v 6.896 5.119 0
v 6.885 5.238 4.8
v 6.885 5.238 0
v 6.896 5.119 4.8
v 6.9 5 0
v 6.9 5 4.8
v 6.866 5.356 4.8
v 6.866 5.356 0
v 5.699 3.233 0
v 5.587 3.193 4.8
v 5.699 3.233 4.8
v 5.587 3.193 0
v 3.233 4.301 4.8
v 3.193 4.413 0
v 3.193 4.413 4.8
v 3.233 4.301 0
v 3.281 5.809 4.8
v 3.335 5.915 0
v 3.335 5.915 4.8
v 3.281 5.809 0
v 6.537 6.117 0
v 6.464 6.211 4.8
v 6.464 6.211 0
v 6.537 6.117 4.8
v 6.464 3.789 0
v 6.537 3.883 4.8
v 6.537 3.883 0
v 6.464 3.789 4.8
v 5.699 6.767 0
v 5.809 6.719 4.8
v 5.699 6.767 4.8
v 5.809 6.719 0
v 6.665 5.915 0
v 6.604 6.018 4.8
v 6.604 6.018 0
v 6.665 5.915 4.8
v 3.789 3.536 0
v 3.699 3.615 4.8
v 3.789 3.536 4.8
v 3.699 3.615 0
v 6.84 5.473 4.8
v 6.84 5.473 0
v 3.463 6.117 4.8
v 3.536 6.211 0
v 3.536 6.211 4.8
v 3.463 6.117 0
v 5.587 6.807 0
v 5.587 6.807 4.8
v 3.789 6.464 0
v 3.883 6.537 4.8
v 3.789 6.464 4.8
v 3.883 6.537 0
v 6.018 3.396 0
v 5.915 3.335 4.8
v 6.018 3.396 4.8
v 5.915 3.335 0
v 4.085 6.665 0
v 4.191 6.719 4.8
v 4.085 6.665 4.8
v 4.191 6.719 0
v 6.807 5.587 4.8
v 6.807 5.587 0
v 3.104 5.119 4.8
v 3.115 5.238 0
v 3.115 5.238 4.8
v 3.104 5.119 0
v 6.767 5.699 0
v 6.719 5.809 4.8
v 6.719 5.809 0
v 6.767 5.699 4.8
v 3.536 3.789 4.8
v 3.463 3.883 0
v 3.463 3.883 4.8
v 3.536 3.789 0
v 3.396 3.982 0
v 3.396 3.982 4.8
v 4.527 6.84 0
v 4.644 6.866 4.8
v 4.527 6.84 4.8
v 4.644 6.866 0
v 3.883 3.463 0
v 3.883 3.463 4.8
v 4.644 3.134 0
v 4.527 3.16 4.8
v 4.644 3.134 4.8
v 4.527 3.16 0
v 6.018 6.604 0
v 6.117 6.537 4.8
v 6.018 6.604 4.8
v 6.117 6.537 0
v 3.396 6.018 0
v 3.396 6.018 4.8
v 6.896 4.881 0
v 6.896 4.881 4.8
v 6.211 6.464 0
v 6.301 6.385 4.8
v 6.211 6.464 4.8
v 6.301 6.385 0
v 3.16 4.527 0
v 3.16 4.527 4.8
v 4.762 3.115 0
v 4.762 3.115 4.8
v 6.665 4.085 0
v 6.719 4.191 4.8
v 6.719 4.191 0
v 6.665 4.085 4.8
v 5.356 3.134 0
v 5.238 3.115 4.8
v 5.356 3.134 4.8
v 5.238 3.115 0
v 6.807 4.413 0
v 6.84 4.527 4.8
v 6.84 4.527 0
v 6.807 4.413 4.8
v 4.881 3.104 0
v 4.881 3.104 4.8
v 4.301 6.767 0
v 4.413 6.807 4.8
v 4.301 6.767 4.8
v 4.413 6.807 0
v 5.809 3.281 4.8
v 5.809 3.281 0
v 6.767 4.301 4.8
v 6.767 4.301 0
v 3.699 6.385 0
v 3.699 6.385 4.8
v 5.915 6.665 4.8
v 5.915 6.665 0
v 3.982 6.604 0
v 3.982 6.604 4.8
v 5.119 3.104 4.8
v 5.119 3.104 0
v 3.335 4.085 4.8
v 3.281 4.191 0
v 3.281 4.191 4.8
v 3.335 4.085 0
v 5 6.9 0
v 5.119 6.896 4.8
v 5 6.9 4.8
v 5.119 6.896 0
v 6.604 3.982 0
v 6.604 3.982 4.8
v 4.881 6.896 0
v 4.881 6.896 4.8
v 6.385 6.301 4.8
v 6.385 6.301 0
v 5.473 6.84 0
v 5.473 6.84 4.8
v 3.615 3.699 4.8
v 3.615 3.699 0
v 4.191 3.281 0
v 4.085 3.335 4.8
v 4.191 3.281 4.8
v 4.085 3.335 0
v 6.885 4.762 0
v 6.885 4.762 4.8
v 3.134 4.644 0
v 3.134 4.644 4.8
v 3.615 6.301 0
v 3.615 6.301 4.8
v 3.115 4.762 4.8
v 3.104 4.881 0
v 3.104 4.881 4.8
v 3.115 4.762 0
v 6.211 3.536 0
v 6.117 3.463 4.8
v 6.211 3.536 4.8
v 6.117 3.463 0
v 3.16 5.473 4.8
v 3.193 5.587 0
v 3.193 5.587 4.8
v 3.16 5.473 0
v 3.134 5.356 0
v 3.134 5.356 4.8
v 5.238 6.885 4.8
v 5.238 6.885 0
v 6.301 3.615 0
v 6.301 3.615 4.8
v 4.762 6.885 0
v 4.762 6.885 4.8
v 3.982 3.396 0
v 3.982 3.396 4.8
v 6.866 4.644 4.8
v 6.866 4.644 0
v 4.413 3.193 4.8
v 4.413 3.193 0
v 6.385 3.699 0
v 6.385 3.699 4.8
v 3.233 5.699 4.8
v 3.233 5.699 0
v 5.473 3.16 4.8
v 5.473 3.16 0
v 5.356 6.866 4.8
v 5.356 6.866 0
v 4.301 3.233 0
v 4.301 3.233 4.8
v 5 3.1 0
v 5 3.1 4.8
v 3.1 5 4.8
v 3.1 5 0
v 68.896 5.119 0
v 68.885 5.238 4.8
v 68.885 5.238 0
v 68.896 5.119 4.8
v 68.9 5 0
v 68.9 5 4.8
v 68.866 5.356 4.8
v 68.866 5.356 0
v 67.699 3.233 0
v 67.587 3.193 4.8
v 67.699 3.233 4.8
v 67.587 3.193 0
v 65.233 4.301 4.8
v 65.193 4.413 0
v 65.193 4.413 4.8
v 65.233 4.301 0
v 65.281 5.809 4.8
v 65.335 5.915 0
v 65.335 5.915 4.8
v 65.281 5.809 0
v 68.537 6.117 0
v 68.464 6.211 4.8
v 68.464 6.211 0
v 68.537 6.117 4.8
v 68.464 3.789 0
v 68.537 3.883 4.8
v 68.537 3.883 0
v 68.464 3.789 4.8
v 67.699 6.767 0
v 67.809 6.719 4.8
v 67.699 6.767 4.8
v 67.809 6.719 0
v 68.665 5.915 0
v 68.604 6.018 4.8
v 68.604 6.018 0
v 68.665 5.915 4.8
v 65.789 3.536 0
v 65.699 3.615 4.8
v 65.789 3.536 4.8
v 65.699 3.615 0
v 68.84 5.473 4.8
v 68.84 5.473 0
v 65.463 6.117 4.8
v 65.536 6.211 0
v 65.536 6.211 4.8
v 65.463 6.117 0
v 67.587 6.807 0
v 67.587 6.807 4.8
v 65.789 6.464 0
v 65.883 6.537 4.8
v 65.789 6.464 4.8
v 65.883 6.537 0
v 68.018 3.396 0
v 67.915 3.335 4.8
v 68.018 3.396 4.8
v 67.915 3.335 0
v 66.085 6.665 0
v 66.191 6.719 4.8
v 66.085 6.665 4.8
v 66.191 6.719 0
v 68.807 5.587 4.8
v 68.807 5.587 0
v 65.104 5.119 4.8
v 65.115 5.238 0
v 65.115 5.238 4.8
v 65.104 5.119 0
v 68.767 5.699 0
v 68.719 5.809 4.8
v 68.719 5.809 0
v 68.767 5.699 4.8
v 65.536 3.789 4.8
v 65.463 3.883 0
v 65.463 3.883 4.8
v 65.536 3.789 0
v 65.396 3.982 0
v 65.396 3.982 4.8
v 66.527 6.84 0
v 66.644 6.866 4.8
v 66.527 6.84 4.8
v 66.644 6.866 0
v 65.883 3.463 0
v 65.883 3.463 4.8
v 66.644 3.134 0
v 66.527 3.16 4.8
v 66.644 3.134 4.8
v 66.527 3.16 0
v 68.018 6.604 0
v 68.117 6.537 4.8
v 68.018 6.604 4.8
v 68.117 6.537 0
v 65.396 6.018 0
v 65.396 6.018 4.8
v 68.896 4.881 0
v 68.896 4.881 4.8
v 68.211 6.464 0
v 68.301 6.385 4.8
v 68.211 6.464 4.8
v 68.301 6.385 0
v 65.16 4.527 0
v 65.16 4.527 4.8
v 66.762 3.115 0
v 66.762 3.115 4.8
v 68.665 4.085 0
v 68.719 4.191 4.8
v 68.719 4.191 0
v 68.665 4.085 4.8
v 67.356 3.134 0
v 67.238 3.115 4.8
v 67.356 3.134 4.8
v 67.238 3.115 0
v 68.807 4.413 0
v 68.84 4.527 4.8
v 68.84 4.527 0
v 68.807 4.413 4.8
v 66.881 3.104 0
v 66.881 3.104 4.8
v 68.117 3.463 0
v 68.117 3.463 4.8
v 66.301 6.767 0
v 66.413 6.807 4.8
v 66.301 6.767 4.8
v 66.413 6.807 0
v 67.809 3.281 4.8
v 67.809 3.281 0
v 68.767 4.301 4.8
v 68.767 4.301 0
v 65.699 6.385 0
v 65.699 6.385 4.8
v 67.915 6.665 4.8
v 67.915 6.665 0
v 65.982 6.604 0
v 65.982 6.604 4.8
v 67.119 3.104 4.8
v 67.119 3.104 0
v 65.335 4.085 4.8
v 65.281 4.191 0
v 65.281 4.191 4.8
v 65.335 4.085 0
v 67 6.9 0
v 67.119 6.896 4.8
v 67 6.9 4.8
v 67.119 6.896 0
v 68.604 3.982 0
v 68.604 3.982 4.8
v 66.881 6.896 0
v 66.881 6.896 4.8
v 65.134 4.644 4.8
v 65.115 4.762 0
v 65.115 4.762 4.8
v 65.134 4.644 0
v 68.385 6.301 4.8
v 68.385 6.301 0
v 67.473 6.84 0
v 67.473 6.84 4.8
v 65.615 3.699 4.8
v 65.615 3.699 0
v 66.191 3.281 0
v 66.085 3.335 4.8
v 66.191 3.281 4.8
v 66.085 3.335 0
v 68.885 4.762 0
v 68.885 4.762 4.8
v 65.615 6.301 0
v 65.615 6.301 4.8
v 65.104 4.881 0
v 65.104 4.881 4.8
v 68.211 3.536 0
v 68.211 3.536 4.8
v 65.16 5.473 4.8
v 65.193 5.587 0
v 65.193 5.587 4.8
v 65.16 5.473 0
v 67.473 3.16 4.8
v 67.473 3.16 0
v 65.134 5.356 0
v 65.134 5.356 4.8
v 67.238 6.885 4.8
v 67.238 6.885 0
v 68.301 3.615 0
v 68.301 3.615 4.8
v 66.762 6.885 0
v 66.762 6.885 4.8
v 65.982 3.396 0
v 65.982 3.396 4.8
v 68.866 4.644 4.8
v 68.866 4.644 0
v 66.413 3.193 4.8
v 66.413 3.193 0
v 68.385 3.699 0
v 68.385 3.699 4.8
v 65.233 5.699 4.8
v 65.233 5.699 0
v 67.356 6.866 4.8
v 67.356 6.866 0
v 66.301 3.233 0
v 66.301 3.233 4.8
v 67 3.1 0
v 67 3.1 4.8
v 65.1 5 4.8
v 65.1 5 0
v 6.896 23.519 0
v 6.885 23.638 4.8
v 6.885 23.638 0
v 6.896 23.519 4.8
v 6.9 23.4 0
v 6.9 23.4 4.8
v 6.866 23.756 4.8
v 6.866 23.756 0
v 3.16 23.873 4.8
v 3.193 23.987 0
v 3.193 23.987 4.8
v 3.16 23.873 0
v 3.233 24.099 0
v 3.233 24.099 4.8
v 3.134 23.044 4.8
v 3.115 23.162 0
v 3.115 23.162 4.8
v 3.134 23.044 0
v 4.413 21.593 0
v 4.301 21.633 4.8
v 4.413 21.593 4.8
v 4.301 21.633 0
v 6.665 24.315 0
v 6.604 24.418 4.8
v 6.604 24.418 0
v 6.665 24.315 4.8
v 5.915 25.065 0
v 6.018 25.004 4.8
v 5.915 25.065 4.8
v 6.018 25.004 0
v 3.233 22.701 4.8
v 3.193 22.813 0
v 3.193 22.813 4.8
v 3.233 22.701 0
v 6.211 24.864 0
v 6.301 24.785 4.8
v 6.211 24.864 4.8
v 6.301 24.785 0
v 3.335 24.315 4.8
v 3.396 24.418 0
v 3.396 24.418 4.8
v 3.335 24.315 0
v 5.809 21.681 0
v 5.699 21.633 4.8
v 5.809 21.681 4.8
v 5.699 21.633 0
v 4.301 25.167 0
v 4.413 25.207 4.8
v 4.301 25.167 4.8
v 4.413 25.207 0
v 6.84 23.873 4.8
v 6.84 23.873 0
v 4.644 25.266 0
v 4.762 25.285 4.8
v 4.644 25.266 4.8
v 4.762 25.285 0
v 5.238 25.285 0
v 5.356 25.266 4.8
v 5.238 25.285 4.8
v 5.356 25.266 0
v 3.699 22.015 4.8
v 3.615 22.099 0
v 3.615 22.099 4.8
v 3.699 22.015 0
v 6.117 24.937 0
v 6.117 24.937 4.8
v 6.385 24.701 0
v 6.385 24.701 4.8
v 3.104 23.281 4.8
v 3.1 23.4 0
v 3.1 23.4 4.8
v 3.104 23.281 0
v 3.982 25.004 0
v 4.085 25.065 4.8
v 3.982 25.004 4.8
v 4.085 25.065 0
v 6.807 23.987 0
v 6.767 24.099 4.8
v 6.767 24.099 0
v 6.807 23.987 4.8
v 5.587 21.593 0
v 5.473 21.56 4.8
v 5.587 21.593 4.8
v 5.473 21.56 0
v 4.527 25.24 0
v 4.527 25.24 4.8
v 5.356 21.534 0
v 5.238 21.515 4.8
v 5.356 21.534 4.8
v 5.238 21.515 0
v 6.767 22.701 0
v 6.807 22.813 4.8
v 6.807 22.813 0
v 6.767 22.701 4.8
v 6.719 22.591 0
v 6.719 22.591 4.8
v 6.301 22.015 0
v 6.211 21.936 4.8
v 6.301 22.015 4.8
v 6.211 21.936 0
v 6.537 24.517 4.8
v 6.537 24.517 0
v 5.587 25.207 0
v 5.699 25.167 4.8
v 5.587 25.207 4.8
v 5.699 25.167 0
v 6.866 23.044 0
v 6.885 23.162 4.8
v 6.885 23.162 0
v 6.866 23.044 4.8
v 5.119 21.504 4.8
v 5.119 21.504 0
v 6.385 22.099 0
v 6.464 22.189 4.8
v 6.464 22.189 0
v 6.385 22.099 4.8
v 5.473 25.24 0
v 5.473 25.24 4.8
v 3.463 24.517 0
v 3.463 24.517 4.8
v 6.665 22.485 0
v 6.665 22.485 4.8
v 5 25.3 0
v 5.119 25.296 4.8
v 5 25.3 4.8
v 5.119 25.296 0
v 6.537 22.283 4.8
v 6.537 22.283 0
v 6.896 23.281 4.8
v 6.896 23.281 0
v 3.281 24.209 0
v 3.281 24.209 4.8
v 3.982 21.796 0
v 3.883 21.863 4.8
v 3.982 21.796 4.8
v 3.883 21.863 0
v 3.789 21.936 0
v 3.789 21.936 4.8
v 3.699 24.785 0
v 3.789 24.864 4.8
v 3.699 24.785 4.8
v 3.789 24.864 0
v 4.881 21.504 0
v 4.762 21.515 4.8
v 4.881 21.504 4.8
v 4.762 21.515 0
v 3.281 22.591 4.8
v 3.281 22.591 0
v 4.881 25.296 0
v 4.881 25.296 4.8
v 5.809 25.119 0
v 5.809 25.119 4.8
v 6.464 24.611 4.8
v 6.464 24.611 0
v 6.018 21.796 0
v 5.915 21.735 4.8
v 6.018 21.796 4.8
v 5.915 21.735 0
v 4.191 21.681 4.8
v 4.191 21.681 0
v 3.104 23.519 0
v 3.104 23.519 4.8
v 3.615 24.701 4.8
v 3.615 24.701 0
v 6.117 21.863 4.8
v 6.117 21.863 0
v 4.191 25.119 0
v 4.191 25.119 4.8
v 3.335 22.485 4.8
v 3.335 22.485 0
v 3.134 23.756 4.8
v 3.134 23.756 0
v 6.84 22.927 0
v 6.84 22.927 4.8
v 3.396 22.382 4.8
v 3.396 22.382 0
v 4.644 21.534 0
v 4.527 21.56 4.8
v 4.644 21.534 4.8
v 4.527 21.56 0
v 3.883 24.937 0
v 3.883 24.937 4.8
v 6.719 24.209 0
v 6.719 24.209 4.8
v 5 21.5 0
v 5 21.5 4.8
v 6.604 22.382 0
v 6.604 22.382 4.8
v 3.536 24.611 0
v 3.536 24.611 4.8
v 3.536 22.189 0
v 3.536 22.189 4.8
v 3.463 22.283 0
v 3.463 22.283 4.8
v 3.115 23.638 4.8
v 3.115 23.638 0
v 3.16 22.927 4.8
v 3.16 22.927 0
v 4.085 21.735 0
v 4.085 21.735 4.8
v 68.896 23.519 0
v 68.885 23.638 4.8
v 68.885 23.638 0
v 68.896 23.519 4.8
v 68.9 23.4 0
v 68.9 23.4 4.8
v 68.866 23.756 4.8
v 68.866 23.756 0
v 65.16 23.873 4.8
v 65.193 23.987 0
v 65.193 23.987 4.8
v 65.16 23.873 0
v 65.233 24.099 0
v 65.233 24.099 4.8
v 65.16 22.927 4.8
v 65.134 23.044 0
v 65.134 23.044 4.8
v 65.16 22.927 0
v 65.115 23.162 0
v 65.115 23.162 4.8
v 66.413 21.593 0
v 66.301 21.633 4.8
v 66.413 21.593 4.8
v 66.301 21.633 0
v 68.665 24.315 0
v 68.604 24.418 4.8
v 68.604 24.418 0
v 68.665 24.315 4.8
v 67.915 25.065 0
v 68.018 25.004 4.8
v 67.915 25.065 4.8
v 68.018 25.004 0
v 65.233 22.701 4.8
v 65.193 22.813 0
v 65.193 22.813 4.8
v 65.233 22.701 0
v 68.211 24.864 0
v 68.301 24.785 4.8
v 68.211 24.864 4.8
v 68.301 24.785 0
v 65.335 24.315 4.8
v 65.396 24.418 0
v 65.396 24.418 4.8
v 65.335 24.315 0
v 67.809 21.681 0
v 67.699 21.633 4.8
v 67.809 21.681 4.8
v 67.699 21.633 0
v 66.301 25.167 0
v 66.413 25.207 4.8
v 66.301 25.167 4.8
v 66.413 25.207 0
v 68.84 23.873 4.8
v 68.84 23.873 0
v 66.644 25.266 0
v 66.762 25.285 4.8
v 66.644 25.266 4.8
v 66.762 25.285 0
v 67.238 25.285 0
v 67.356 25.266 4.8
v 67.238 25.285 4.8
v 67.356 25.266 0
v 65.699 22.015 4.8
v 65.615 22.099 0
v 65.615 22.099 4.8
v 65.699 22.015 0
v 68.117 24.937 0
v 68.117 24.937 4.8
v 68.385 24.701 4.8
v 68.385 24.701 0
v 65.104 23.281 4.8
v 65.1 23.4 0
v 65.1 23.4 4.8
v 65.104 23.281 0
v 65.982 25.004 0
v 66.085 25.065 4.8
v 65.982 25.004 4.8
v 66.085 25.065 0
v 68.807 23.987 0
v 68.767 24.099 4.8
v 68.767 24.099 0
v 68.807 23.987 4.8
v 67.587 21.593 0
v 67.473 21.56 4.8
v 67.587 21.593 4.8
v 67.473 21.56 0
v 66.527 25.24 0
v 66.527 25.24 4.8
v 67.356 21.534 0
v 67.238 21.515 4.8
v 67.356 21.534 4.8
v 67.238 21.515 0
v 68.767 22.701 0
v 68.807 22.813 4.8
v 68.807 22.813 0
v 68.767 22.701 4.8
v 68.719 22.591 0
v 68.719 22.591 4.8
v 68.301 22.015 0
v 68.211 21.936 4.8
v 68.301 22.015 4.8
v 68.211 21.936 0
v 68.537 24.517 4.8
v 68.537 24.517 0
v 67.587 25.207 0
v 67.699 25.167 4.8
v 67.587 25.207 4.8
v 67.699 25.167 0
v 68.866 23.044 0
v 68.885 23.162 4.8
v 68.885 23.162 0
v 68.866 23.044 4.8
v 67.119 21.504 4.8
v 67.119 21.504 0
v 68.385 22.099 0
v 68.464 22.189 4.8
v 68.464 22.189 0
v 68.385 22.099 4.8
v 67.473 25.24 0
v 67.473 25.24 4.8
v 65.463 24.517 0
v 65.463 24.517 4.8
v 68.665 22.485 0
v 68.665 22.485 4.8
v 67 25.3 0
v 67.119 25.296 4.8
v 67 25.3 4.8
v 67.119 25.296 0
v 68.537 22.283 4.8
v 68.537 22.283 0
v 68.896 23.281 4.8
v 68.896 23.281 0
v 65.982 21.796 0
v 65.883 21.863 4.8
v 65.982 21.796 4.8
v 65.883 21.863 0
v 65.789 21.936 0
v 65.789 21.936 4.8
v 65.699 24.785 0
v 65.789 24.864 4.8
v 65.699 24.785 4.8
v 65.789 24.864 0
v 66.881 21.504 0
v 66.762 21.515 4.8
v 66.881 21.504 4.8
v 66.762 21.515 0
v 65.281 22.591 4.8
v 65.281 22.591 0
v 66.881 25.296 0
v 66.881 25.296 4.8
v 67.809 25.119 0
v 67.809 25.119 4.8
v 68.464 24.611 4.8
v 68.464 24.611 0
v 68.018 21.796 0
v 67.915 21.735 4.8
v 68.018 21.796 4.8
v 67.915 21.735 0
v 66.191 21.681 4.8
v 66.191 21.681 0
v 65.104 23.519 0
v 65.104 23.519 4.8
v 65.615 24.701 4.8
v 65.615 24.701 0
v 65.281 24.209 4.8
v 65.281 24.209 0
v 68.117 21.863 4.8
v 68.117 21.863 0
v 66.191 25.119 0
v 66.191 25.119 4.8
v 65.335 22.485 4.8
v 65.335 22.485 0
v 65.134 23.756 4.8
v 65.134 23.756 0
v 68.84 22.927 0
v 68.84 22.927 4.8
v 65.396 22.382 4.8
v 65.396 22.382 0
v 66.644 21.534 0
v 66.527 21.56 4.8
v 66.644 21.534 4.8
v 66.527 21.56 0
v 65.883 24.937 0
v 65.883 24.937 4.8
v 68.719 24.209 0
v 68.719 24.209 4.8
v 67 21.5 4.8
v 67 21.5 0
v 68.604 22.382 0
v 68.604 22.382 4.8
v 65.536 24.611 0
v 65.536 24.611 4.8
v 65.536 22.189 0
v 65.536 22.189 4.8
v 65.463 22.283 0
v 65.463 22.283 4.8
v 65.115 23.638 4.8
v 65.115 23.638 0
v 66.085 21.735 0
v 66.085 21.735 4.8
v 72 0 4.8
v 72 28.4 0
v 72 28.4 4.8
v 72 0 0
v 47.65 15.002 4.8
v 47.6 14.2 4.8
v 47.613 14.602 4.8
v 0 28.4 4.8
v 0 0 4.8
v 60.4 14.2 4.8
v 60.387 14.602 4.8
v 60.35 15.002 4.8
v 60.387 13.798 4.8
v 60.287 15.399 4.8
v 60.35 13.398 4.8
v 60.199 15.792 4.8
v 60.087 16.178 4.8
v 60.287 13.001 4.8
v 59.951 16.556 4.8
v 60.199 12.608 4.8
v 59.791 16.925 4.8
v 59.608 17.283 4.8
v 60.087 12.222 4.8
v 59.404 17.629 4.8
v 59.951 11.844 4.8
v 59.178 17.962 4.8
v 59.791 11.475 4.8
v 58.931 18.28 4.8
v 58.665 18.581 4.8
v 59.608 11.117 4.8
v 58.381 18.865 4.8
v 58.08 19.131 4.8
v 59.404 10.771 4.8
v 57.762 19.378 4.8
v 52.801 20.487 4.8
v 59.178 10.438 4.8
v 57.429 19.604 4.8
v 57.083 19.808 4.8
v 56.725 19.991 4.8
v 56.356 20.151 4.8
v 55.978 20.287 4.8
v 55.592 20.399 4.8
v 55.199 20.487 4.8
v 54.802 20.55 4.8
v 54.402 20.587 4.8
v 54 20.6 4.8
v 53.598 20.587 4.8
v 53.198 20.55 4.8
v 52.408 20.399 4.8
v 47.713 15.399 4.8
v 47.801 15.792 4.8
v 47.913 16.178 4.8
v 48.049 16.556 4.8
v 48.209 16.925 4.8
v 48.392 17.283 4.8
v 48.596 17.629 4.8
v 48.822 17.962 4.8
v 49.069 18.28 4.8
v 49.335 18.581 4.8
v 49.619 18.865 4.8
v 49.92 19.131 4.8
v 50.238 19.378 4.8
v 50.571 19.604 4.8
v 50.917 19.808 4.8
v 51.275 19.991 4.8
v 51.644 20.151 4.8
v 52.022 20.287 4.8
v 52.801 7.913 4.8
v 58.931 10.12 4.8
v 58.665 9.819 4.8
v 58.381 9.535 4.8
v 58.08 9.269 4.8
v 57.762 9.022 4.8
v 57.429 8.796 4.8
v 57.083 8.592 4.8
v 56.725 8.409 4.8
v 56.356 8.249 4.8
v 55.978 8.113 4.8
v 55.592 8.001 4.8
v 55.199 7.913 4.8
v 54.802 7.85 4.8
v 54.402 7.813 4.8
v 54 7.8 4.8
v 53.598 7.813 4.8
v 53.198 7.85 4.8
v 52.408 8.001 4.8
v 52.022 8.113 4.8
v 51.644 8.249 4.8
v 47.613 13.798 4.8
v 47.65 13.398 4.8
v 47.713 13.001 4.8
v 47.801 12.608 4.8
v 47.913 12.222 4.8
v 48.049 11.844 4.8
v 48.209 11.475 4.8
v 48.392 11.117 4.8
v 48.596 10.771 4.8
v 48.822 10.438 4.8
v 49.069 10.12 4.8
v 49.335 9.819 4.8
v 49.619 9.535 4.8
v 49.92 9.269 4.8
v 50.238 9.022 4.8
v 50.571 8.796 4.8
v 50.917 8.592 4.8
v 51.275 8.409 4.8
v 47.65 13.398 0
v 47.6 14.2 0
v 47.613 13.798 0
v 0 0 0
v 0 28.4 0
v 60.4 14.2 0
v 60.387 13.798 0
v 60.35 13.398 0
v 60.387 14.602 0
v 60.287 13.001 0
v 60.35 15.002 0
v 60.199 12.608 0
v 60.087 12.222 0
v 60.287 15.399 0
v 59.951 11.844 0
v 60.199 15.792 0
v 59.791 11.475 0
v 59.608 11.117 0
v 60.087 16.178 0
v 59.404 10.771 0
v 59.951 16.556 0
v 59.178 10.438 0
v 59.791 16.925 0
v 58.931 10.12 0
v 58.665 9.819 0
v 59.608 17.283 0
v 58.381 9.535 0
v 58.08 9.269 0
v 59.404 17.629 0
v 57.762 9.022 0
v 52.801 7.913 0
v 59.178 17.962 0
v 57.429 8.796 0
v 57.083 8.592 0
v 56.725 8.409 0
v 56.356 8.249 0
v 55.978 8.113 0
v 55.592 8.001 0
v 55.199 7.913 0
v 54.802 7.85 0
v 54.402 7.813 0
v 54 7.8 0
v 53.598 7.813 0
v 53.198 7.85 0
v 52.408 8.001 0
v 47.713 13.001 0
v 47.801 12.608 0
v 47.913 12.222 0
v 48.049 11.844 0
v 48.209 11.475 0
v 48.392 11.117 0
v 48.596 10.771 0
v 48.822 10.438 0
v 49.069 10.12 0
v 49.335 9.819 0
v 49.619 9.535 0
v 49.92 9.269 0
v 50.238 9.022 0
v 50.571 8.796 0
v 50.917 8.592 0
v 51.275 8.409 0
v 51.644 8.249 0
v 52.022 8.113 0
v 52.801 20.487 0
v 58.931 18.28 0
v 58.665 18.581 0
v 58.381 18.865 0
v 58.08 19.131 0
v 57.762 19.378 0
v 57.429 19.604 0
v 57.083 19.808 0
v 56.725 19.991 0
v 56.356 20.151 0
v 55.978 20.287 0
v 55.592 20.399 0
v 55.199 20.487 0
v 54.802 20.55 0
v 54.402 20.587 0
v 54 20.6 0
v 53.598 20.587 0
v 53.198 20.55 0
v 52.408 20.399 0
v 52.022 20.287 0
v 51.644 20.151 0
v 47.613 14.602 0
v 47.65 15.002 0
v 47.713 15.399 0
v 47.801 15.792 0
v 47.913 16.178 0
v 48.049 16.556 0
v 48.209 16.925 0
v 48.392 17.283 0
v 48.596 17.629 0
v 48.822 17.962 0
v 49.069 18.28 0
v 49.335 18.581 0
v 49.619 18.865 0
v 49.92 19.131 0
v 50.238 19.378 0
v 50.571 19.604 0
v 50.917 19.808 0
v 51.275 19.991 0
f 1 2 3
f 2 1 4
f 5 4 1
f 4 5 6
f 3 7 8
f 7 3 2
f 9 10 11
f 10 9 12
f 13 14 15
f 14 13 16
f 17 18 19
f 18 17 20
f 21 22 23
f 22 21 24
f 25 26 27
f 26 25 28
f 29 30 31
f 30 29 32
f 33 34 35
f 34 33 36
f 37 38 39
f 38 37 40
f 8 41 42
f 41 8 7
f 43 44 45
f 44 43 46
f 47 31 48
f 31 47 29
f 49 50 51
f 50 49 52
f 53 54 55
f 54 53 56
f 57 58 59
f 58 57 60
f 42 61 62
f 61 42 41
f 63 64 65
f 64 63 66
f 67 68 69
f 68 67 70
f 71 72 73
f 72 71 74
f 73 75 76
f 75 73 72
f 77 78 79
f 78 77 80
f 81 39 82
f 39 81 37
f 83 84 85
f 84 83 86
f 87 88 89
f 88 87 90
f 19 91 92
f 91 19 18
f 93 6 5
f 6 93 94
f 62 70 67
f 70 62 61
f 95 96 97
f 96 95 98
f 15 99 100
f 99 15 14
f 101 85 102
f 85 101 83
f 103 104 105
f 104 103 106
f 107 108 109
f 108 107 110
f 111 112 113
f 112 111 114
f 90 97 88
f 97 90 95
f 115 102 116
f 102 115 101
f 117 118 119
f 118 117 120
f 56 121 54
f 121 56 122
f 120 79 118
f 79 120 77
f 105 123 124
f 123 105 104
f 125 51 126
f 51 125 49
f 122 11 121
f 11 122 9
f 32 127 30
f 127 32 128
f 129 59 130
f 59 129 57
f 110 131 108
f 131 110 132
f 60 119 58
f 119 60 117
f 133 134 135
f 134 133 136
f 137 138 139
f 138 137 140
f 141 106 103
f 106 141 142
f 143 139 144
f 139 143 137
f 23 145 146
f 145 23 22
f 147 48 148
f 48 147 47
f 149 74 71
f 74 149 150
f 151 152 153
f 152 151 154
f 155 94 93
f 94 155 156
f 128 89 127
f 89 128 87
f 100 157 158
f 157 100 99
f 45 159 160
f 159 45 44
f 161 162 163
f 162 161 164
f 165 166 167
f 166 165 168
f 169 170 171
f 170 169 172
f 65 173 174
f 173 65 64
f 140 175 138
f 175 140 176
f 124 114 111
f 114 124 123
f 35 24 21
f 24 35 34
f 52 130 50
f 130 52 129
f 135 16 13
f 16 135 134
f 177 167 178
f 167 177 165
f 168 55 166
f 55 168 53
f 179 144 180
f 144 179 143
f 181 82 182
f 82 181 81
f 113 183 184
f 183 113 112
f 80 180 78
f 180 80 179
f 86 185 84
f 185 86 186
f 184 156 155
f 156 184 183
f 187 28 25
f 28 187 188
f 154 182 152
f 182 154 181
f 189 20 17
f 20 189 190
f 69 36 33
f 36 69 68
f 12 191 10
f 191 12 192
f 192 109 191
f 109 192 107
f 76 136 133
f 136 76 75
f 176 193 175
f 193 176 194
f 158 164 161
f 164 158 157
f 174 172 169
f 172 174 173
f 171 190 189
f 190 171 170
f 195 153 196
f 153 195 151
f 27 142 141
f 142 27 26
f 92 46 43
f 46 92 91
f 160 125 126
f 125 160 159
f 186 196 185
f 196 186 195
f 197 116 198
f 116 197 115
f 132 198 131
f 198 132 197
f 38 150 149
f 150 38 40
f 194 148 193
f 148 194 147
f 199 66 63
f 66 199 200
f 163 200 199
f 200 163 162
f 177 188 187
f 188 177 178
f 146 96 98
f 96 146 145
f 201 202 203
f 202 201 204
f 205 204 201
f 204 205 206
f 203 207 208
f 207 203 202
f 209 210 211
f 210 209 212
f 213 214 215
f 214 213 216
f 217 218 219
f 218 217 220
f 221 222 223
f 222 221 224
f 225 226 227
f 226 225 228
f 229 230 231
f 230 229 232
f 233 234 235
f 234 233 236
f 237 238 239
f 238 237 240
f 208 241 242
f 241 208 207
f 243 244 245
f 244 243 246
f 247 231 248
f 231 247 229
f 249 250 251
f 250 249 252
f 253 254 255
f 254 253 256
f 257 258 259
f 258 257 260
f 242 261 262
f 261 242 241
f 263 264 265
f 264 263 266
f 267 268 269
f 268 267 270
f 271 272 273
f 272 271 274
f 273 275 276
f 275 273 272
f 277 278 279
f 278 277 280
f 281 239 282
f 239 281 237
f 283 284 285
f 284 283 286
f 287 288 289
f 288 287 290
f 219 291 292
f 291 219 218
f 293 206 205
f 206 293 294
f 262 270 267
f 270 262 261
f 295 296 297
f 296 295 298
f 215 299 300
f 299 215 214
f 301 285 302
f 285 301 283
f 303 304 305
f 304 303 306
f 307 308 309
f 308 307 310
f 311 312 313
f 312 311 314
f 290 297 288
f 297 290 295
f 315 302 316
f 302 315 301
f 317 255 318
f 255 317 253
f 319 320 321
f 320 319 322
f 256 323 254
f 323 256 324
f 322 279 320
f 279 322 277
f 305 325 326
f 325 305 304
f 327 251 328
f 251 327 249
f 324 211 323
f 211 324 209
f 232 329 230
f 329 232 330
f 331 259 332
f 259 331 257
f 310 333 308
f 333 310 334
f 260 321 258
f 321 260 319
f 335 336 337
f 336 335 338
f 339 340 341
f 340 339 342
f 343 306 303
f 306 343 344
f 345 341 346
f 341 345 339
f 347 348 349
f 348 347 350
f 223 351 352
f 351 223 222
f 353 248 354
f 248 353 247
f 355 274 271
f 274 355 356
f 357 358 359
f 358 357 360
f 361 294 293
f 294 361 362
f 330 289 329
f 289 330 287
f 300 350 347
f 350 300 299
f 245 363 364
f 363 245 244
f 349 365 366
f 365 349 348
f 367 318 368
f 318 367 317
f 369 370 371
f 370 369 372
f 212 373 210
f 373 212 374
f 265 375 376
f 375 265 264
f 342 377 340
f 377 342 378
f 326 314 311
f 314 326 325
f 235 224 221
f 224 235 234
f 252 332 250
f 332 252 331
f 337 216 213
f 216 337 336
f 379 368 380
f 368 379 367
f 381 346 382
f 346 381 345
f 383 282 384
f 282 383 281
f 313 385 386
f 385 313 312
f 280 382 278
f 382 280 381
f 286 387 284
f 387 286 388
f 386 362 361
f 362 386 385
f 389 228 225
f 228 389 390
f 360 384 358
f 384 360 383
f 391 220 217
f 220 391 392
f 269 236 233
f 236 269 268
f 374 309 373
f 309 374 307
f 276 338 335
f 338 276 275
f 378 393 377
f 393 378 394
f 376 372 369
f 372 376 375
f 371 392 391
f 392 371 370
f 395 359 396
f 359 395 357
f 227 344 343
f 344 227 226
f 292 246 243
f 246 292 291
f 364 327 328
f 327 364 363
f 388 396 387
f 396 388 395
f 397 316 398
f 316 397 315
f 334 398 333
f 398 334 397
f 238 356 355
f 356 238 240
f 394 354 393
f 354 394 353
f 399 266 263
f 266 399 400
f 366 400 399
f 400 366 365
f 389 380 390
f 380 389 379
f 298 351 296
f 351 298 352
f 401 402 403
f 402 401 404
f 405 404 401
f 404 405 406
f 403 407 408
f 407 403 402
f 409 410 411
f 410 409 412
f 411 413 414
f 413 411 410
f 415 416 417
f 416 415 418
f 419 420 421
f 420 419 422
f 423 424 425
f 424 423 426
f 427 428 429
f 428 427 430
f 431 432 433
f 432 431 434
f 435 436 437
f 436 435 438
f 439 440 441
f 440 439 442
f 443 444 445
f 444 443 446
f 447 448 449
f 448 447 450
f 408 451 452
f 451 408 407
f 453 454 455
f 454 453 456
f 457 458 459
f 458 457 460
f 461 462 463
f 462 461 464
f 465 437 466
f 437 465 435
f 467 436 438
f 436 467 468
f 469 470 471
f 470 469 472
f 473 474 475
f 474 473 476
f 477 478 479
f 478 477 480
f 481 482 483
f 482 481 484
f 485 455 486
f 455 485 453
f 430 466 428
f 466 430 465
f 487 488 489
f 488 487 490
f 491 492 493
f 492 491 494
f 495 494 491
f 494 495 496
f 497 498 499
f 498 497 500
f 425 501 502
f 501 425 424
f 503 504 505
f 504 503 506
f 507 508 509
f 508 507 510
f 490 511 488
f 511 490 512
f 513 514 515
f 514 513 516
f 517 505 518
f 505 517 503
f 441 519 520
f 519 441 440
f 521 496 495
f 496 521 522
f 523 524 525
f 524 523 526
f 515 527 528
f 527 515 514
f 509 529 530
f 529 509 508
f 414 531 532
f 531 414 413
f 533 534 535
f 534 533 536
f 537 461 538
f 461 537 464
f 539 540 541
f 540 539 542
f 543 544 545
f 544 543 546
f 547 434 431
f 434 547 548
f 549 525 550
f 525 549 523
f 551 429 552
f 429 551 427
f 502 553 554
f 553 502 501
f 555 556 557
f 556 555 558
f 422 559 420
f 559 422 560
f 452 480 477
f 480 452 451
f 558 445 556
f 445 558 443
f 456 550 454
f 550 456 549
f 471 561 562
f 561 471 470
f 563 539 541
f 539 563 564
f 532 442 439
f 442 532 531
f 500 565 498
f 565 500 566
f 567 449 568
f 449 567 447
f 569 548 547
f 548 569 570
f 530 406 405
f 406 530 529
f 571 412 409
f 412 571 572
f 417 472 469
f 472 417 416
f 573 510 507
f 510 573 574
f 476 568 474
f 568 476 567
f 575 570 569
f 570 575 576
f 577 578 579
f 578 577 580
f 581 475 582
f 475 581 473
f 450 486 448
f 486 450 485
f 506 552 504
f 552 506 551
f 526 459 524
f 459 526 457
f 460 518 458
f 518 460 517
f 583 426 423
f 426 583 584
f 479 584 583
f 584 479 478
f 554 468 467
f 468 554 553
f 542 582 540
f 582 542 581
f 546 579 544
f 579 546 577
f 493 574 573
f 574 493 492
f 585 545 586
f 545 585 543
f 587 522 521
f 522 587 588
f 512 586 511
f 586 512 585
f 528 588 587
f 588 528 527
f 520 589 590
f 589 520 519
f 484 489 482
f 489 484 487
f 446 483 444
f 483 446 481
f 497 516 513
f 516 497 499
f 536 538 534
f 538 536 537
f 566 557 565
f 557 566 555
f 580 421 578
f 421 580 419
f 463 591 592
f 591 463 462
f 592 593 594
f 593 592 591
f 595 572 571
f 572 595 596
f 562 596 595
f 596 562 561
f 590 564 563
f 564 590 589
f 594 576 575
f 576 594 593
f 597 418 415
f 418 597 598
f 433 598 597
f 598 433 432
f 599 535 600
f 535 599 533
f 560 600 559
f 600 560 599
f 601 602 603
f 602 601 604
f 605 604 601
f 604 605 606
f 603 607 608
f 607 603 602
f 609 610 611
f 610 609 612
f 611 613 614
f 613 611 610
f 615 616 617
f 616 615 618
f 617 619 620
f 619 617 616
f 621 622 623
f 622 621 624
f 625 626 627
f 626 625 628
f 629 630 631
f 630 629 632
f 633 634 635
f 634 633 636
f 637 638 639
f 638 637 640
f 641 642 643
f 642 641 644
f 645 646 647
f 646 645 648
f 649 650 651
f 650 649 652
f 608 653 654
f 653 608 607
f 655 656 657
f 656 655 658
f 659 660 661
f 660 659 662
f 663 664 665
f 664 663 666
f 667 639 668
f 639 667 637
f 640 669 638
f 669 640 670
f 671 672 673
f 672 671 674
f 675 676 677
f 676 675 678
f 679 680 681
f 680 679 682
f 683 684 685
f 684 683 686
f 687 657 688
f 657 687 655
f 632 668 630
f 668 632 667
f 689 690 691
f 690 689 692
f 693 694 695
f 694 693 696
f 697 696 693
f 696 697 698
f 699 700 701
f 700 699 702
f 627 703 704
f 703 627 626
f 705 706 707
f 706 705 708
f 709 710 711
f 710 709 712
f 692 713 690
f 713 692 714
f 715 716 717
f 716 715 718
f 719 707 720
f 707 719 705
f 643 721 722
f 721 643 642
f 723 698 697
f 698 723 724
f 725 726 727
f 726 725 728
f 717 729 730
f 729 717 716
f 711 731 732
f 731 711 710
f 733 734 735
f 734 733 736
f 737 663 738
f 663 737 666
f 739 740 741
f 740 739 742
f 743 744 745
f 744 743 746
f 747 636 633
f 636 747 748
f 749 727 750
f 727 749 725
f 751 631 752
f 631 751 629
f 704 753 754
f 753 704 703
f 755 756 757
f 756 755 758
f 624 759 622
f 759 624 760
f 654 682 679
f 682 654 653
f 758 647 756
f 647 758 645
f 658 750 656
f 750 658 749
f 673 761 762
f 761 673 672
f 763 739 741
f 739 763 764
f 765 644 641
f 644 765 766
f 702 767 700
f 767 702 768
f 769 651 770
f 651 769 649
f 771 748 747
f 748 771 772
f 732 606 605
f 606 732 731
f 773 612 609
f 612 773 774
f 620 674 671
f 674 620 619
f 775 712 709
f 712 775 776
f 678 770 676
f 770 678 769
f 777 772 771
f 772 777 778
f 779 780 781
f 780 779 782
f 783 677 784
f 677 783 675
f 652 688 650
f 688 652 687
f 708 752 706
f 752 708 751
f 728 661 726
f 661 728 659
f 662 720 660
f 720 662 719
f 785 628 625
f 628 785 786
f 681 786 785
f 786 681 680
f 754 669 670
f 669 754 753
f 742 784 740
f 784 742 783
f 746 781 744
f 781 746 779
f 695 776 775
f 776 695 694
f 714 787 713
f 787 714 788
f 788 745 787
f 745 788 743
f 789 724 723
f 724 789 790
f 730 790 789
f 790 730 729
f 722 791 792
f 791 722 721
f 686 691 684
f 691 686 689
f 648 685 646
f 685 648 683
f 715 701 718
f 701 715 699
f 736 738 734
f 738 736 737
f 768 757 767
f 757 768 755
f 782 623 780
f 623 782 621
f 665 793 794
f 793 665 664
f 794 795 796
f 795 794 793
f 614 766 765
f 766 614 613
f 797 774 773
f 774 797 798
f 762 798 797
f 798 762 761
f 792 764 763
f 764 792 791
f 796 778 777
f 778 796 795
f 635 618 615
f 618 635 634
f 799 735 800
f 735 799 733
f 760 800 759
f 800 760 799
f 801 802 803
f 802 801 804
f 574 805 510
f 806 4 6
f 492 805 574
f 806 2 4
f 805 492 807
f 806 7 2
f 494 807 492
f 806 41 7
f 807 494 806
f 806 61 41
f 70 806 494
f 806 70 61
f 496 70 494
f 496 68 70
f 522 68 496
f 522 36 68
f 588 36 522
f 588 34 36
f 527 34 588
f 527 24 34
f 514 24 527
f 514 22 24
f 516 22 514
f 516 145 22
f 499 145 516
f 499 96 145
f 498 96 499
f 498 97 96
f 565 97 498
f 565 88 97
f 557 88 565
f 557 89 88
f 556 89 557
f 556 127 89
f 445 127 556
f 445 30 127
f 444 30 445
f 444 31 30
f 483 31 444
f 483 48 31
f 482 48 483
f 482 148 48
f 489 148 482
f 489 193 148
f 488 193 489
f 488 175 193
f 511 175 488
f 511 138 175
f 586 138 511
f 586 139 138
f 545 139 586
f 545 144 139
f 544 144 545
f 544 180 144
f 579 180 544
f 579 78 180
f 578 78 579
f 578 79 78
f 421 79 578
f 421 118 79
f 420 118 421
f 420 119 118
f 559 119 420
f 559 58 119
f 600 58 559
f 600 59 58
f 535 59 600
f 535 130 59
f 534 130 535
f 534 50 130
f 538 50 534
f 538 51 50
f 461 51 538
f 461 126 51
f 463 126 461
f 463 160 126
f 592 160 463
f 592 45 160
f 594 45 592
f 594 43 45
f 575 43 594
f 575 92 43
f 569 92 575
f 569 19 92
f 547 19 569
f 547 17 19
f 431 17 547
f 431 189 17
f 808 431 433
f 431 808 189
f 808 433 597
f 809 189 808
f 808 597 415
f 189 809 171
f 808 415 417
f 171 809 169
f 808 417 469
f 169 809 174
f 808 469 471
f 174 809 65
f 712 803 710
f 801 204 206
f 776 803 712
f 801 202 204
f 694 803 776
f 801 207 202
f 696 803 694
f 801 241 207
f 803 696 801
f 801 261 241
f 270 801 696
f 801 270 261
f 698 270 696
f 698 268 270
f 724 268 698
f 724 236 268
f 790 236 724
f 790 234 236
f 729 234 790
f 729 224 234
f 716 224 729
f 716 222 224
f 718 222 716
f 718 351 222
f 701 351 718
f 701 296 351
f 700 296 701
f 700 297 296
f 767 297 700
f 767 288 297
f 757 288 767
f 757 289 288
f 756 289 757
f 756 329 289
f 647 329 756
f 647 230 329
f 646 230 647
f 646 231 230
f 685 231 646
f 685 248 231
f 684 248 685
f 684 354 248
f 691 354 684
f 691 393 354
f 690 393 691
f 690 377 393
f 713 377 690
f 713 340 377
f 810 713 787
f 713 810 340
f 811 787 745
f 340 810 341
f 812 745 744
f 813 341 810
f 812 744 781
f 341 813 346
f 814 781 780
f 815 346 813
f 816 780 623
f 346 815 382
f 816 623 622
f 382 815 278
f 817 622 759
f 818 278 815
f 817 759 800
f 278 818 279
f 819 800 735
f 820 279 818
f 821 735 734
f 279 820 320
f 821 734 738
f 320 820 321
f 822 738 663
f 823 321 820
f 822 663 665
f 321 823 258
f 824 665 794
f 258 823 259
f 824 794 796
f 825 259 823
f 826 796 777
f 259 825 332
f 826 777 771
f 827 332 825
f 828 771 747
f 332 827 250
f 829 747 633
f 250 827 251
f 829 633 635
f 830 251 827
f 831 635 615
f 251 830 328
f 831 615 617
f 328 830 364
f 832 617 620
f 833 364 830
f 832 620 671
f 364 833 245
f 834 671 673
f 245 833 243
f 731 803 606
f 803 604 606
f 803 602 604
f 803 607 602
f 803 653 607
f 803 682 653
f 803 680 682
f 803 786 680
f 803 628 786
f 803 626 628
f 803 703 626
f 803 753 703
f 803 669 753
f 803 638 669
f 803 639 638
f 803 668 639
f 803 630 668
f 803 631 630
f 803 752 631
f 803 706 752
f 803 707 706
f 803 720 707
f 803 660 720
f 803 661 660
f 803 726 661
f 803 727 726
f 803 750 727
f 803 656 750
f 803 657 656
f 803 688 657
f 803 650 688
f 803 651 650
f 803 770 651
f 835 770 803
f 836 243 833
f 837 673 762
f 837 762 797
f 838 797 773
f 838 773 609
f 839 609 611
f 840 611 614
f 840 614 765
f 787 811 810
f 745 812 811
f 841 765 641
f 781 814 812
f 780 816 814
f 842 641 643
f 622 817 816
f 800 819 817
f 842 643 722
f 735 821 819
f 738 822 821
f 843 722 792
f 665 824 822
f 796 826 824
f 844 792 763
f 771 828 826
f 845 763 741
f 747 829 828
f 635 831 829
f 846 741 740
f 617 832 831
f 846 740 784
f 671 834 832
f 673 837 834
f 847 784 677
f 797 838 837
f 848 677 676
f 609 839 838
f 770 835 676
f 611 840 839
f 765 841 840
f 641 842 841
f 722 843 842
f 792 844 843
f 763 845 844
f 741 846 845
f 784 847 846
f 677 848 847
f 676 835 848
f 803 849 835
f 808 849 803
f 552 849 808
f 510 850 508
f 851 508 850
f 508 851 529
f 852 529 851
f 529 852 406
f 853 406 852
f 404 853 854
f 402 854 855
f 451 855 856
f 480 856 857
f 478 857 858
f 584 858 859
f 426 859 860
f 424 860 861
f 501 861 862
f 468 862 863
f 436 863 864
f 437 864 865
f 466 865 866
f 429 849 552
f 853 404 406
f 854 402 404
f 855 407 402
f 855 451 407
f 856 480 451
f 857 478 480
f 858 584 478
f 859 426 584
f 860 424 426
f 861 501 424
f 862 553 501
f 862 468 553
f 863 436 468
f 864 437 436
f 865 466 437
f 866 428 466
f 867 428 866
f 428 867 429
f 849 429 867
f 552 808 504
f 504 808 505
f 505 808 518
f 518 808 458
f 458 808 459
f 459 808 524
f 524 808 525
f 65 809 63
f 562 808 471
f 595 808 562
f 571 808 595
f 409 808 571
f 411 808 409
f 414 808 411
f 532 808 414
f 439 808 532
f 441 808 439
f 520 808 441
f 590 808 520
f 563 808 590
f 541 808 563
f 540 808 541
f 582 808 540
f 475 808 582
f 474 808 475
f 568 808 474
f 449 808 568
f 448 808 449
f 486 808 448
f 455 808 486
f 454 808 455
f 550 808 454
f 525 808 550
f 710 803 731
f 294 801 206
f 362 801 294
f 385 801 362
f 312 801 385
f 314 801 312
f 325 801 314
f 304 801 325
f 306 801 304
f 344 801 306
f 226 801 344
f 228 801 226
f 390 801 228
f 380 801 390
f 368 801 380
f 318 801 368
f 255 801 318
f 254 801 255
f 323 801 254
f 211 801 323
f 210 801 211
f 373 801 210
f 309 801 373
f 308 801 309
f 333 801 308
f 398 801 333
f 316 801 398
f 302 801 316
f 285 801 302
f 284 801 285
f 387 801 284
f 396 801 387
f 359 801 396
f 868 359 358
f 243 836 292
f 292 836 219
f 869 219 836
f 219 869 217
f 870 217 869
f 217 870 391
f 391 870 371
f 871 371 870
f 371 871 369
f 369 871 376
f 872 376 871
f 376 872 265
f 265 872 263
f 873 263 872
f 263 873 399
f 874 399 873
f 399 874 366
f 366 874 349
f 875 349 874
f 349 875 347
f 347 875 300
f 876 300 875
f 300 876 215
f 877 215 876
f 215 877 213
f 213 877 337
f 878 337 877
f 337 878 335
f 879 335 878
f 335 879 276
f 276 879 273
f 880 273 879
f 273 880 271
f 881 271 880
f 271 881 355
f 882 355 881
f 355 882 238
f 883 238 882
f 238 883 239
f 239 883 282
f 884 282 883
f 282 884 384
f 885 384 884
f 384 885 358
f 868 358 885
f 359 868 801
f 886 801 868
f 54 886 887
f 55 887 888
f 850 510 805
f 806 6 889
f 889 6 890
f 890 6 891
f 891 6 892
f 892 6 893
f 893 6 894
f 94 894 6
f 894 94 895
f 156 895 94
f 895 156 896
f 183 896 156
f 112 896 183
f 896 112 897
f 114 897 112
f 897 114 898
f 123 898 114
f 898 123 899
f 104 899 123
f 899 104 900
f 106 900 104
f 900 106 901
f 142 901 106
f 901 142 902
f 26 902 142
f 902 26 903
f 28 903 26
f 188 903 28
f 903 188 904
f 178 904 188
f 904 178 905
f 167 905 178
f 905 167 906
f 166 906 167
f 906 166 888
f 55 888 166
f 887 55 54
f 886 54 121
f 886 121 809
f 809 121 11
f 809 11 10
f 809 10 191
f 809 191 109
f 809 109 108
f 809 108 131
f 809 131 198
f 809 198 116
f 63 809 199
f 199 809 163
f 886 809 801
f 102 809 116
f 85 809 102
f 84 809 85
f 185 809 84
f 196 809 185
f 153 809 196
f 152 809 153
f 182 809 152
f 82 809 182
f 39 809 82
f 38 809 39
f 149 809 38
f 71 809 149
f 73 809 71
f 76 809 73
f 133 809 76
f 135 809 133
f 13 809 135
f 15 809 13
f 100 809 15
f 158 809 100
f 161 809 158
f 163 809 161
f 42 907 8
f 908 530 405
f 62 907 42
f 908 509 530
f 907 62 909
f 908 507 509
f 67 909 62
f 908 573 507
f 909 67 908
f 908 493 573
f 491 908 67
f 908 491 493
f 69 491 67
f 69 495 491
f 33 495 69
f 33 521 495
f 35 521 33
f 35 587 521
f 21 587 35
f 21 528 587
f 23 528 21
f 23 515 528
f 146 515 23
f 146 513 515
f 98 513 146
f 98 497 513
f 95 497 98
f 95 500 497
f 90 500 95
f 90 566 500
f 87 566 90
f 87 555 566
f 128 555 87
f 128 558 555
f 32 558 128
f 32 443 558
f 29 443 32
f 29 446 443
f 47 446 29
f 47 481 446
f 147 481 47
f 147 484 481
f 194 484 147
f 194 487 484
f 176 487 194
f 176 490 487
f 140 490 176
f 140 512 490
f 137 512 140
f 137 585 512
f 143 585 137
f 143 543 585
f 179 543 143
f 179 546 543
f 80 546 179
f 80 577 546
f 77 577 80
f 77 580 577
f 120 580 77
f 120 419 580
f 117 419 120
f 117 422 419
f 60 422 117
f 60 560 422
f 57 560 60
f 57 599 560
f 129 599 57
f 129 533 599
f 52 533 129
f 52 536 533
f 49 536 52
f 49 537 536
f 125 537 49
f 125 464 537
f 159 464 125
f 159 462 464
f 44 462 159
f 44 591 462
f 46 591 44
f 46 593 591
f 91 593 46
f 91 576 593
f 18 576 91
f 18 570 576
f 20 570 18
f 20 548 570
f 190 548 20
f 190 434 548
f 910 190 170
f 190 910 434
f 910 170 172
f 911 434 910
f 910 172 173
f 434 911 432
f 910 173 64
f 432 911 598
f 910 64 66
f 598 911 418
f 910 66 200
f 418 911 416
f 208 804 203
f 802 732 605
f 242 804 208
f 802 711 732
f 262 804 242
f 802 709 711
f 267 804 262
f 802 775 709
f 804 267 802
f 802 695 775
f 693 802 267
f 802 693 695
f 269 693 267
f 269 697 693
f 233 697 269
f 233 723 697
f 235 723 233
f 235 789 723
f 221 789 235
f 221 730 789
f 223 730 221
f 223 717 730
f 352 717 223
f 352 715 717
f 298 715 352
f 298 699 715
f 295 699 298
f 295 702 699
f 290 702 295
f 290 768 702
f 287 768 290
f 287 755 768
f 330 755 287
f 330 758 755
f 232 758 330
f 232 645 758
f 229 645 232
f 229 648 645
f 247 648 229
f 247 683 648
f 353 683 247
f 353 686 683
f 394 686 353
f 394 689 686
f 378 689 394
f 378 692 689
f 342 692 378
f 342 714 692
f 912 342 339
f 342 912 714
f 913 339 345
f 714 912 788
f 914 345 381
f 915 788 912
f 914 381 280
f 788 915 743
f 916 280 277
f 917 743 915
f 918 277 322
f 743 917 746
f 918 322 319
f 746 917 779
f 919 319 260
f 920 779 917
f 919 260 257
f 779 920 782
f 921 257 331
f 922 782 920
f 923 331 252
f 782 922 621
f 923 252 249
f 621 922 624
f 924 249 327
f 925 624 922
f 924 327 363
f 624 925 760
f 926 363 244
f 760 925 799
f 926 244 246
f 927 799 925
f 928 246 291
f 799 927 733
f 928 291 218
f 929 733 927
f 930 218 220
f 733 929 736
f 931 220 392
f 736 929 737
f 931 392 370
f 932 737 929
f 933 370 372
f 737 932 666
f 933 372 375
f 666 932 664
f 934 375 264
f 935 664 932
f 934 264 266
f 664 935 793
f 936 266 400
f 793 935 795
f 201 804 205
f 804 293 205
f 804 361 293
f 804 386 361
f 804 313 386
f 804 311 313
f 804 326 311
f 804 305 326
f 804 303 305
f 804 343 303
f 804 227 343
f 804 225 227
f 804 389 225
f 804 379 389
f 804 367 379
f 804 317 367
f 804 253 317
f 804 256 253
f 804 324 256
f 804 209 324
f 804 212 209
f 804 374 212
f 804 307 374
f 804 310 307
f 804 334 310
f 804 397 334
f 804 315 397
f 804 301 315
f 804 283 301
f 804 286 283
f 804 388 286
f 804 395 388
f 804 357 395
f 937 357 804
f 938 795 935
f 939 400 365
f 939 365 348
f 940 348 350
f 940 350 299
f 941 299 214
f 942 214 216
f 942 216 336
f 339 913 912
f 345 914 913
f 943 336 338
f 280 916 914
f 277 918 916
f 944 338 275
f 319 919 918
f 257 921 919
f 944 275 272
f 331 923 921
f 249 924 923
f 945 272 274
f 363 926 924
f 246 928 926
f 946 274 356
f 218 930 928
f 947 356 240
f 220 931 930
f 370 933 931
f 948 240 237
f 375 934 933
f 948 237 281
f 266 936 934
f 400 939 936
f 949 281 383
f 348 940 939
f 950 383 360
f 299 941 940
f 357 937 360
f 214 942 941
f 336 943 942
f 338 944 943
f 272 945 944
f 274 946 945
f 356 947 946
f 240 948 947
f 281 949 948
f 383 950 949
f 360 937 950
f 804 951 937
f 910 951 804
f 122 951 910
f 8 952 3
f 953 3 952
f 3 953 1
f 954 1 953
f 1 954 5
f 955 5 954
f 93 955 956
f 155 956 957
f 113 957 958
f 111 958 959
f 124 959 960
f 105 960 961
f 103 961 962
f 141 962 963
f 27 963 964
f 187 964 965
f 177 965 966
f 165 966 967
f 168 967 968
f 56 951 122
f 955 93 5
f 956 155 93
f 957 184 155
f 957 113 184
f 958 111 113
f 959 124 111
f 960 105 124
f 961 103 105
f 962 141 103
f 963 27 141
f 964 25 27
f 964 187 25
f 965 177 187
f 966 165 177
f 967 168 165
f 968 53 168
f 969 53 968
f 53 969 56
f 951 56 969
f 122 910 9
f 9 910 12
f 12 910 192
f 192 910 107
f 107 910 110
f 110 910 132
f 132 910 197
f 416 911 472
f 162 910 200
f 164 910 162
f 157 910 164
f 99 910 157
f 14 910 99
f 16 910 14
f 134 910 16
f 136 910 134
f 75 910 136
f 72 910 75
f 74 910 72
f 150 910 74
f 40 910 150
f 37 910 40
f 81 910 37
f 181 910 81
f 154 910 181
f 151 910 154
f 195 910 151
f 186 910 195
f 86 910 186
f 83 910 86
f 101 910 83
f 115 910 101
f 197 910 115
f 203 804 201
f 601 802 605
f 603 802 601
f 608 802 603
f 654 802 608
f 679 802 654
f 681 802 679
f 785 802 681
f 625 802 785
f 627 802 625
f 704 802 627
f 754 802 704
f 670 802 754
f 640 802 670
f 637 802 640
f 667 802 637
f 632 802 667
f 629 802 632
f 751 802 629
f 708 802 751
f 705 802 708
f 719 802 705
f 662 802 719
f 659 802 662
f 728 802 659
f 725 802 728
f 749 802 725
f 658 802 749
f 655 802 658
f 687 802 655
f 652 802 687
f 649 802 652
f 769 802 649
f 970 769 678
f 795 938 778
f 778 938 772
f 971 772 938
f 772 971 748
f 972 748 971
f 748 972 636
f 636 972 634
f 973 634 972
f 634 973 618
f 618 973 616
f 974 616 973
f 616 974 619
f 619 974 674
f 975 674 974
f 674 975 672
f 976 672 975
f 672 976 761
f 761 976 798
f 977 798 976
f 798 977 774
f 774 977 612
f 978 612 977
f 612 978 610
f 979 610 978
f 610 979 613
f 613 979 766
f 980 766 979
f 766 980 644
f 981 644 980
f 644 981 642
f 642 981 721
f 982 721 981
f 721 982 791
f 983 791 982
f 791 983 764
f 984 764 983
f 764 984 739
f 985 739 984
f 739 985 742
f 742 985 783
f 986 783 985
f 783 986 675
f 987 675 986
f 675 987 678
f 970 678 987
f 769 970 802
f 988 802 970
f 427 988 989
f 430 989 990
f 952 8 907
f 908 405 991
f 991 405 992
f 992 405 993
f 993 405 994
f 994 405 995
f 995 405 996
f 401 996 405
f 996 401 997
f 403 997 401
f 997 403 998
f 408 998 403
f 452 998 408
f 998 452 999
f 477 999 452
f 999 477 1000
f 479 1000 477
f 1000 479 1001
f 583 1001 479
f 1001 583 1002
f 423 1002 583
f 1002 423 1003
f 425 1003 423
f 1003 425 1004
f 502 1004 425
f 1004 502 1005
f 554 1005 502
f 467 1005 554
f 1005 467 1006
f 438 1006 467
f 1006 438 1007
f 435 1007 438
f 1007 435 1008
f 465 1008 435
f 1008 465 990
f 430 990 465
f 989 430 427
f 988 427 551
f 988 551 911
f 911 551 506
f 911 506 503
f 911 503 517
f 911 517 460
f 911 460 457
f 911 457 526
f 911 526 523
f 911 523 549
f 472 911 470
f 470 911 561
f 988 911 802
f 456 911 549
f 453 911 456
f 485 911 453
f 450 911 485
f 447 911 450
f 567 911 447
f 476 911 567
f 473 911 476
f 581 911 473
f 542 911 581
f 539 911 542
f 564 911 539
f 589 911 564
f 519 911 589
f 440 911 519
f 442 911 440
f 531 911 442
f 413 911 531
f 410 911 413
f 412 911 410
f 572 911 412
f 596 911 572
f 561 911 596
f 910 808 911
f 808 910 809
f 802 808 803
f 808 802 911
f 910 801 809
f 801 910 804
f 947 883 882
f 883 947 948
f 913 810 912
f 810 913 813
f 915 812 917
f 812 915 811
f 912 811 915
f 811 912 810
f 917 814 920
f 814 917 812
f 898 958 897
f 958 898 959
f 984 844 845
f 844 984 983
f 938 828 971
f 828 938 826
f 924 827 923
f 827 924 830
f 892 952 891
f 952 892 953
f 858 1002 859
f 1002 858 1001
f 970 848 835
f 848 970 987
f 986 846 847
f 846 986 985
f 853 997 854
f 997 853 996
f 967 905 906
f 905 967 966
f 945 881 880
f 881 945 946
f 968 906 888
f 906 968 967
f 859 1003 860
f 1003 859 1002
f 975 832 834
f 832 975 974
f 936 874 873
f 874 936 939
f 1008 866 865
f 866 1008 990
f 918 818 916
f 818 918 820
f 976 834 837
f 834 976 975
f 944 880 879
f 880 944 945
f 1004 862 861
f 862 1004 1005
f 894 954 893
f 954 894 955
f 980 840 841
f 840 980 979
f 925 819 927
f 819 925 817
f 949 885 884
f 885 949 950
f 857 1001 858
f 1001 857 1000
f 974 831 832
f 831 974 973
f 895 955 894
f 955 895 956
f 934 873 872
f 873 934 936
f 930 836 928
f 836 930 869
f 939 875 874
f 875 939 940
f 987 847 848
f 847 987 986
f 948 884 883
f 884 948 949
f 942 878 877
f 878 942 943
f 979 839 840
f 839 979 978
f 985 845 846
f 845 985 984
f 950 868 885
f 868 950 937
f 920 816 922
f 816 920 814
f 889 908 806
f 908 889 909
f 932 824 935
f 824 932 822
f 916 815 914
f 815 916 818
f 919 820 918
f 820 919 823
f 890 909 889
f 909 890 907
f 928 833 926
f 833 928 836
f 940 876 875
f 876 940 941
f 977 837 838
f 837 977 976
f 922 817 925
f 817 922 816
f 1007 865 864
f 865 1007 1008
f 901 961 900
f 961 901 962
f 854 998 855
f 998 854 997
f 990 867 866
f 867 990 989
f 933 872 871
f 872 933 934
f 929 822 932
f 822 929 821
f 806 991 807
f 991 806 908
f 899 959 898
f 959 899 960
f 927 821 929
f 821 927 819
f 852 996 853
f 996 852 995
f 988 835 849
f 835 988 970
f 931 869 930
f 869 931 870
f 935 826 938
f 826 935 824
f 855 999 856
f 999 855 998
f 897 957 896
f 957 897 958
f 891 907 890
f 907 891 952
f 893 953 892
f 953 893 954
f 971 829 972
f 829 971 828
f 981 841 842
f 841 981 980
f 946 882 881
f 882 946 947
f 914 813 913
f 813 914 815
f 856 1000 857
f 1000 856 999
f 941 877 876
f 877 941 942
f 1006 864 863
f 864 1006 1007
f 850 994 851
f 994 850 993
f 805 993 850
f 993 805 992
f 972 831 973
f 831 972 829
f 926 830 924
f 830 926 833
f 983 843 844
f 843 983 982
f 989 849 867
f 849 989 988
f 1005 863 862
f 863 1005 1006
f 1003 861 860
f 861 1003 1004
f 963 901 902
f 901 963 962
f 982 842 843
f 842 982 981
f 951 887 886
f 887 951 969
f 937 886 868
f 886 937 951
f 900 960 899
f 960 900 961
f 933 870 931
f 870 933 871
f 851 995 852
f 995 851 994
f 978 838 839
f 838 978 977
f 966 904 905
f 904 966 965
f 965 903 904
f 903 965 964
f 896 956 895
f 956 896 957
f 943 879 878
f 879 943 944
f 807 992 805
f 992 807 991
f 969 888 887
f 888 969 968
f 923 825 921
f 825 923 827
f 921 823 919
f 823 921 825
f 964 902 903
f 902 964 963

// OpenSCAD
// file: ../configurations/global.scad
housing_facades_throws_diameter = 3.8;

// external size
case_external_x_size = 90;
case_external_y_size = 140;
case_external_z_size = 38;
case_external_panes_thickness = 4.8;

facade_front_round_edges_radius = 5;
facade_throws_margin = 5;

facade_front_fixation_throws_diameter = housing_facades_throws_diameter;

// facade corners
facade_corners_offset_lenght = 9;
facade_corners_main_x_size = 19;
facade_corners_main_y_size = 19;
facade_corners_main_thickness = 11;
facade_corners_correction_offset_length = 0.2;
facade_corners_correction_offset_thickness = 0.0;
facade_fn = 100;


facade_controller_coords = [
    case_external_x_size / 2,
    case_external_y_size / 2 - 30,
];


// Screen frames
screen_frame_electronic_board_margin = 3;
screen_frame_throw_diameter = 3.5;
screen_frame_piece_z_size = 1.5;
screen_frame_piece_glass_embedding_margin = 1;
screen_frame_piece_glass_embedding_z_depth = 1;
screen_frame_facade_piece_z_size = 1;
screen_frame_fn = 100;

screen_glass_visible_zone_x_margin = 0.7;
screen_glass_visible_zone_y_margin = 0.7;
screen_glass_z_size = 1;

facade_screen_coords = [
    case_external_x_size / 2,
    case_external_y_size / 2 + 28,
];


// Generics
insert_throw_diameter = 4.2;
insert_throw_length = 6 + 2;


// Controller facade
controller_breadboard_x_size_point = 28;
controller_breadboard_y_size_point = 9;

controller_facade_z_size = 2;
controller_facade_button_throw_margin = 1;
controller_facade_small_button_throw_margin = 0.5;
controller_facade_a_b_button_throw_margin = 0.5;

controller_facade_border_rounded_border_1 = 5;
controller_facade_border_rounded_border_2 = 4;

controller_facade_with_border_x_size = 82;
controller_facade_with_border_y_size = 47;

controller_facade_border_throws_margin = 5;
controller_braidboard_throw_margin = 1;

controller_facade_border_fn = 80;


// Cross Button
controller_cross_button_x_y_size = 20;
controller_cross_button_z_size = 4;
controller_cross_button_thickness = 6;
controller_cross_button_round_edges_radius = 1;
controller_cross_button_support_x_y_size = 22;
controller_cross_button_support_z_size = 1;
controller_cross_button_fn = 150;


// A and B Buttons
controller_a_b_button_diameter = 7.5;
controller_a_b_button_z_size = 4;
controller_a_b_button_support_diameter = 9.5;
controller_a_b_button_support_z_size = 1;
controller_a_b_button_fn = 80;


// small Buttons
controller_small_button_diameter = 5.5;
controller_small_button_z_size = 3;
controller_small_button_support_diameter = 7.5;
controller_small_button_support_z_size = 1;
controller_small_button_fn = 80;

// Directional cross
controller_directional_cross_points_coords = [6, 5];
controller_start_button_points_coords = [14, 3];
controller_select_button_points_coords = [18, 3];
controller_menu_button_points_coords = [14, 7];
controller_option_button_points_coords = [18, 7];
controller_a_button_points_coords = [23, 4];
controller_b_button_points_coords = [27, 6];
controller_bolt_throws_list = [
    [2, 2],
    [2, 8],
    [10, 2],
    [10, 8],
    [27, 2],
    [23, 8],
];


// usb charger holder
usb_charger_support_total_x_size = 17.57 + 15;
usb_charger_support_total_y_size = 12;
usb_charger_support_total_z_size = 2;


usb_charger_fixation_support_z_size = 4.5;
usb_charger_encaps_x_size = 17.57 + 1;
usb_charger_encaps_y_size = 27.85 + 1;
usb_charger_encaps_z_size = 1;

usb_charger_facade_x_fixation_spacing = 42;
usb_charger_facade_y_size = 1.36;
usb_charger_facade_z_size = 14;

usb_charger_throw_diameter = 3.5;
usb_charger_facade_holder_z_offset = 3.5; //
usb_charger_fixation_facade_y_margin = 0.5;
usb_charger_throw_offset_y = 4.5;
usb_charger_throw_offset_x = 3.5;
usb_charger_facade_fn = 100;

usb_charger_external_facade_main_throw_margin = 2;
usb_charger_external_facade_main_throw_diameter = housing_facades_throws_diameter;

usb_charger_coords = [
    28, 15
];


facade_top_on_off_button_throw_diameter = 12.8;

facade_top_on_off_button_coords = [
    case_external_x_size / 2 + 18,
    case_external_z_size / 2
];


// Bolt join Piece Mother board
bolt_join_mother_board_internal_diameter = 3.5;
bolt_join_mother_board_external_diameter = 3.5 + (0.4 * 6);
bolt_join_mother_board_height = 3;

// Bolt join Piece GamePadController
bolt_join_game_pad_internal_diameter = 3.5;
bolt_join_game_pad_external_diameter = 3.5 + (0.4 * 6);
bolt_join_game_pad_height = 6.5;

bolt_join_fn = 500;


// Mother board breadboard
mother_board_x_size_point = 25;
mother_board_y_size_point = 32;

mother_board_coords = [
    case_external_x_size / 2 - ((mother_board_x_size_point + 1) * 2.54) / 2,
    44,
    3
];

mother_board_bolt_throws_list = [
    [3, 2],
    [3, 17],
    [23, 2],
    [23, 17],
];


// Speaker
speaker_facade_throw_diameter = 28 + 1;
speaker_facade_z_size = 1.36;
speaker_facade_rounded_radius = 5;
// file: ../enveloppes/onOffButtonThrowEnveloppe.scad
include <../configurations/global.scad>

/**
 * onOffButtonThrowEnveloppe
 * @name onOffButtonThrowEnveloppe
 * @description onOffButtonThrowEnveloppe
 * @type enveloppe
 * @parent root
 */
module onOffButtonThrowEnveloppe(
    z_size = case_external_panes_thickness * 2,
    throw_diameter = facade_top_on_off_button_throw_diameter
) {
    cylinder(h = z_size, d = throw_diameter, center = true, $fn = $fn);
}

onOffButtonThrowEnveloppe();
// file: ../libraries/commons.scad
/**
 * forEachCoord
 * Wrapper to apply child on each element
 */
module forEachCoord(coords_list) {
    for (coords = coords_list)
        translate(
            [
                coords[0] == undef ? 0 : coords[0],
                coords[1] == undef ? 0 : coords[1],
                coords[2] == undef ? 0 : coords[2],
            ]
        )
            children();
}
// main file
use <./../libraries/commons.scad>
use <./../enveloppes/onOffButtonThrowEnveloppe.scad>

include <./../configurations/global.scad>


/**
 * facadeTopPiece
 * @name facadeTopPiece
 * @description Piece can be printed or CNC cutted #3DPrint, #CNC
 * @type piece
 * @parent housingComponent
 */
module facadeTopPiece(
    x_size = case_external_x_size - (facade_corners_offset_lenght * 2),
    y_size = case_external_z_size - (case_external_panes_thickness * 2),
    z_size = case_external_panes_thickness,
    throws_margin = facade_throws_margin,
    throws_diameter = housing_facades_throws_diameter,
    facade_top_on_off_button_coords = facade_top_on_off_button_coords,
    facade_corners_offset_lenght = facade_corners_offset_lenght,
    case_external_panes_thickness = case_external_panes_thickness,
    $fn = facade_fn
) {
    echo(str("x_size: ", x_size, " y_size: ", y_size, " z_size: ", z_size));

    difference() {
        color("BurlyWood")
            cube([x_size, y_size, z_size]);

        translate([0, 0, -z_size / 2])
            forEachCoord([
                [throws_margin, throws_margin],
                [x_size - throws_margin, throws_margin],
                [throws_margin, y_size - throws_margin],
                [x_size - throws_margin, y_size - throws_margin,],
            ])
                cylinder(h = z_size * 2, d = throws_diameter, $fn = $fn);

        
        translate([
                facade_top_on_off_button_coords[0] - facade_corners_offset_lenght,
                facade_top_on_off_button_coords[1] - case_external_panes_thickness,
                z_size / 2
            ])
                onOffButtonThrowEnveloppe();
    }

}

/**
 * @stl
 * @png
 * @colorscheme BeforeDawn
 * @view axes,scales
 */
facadeTopPiece();
